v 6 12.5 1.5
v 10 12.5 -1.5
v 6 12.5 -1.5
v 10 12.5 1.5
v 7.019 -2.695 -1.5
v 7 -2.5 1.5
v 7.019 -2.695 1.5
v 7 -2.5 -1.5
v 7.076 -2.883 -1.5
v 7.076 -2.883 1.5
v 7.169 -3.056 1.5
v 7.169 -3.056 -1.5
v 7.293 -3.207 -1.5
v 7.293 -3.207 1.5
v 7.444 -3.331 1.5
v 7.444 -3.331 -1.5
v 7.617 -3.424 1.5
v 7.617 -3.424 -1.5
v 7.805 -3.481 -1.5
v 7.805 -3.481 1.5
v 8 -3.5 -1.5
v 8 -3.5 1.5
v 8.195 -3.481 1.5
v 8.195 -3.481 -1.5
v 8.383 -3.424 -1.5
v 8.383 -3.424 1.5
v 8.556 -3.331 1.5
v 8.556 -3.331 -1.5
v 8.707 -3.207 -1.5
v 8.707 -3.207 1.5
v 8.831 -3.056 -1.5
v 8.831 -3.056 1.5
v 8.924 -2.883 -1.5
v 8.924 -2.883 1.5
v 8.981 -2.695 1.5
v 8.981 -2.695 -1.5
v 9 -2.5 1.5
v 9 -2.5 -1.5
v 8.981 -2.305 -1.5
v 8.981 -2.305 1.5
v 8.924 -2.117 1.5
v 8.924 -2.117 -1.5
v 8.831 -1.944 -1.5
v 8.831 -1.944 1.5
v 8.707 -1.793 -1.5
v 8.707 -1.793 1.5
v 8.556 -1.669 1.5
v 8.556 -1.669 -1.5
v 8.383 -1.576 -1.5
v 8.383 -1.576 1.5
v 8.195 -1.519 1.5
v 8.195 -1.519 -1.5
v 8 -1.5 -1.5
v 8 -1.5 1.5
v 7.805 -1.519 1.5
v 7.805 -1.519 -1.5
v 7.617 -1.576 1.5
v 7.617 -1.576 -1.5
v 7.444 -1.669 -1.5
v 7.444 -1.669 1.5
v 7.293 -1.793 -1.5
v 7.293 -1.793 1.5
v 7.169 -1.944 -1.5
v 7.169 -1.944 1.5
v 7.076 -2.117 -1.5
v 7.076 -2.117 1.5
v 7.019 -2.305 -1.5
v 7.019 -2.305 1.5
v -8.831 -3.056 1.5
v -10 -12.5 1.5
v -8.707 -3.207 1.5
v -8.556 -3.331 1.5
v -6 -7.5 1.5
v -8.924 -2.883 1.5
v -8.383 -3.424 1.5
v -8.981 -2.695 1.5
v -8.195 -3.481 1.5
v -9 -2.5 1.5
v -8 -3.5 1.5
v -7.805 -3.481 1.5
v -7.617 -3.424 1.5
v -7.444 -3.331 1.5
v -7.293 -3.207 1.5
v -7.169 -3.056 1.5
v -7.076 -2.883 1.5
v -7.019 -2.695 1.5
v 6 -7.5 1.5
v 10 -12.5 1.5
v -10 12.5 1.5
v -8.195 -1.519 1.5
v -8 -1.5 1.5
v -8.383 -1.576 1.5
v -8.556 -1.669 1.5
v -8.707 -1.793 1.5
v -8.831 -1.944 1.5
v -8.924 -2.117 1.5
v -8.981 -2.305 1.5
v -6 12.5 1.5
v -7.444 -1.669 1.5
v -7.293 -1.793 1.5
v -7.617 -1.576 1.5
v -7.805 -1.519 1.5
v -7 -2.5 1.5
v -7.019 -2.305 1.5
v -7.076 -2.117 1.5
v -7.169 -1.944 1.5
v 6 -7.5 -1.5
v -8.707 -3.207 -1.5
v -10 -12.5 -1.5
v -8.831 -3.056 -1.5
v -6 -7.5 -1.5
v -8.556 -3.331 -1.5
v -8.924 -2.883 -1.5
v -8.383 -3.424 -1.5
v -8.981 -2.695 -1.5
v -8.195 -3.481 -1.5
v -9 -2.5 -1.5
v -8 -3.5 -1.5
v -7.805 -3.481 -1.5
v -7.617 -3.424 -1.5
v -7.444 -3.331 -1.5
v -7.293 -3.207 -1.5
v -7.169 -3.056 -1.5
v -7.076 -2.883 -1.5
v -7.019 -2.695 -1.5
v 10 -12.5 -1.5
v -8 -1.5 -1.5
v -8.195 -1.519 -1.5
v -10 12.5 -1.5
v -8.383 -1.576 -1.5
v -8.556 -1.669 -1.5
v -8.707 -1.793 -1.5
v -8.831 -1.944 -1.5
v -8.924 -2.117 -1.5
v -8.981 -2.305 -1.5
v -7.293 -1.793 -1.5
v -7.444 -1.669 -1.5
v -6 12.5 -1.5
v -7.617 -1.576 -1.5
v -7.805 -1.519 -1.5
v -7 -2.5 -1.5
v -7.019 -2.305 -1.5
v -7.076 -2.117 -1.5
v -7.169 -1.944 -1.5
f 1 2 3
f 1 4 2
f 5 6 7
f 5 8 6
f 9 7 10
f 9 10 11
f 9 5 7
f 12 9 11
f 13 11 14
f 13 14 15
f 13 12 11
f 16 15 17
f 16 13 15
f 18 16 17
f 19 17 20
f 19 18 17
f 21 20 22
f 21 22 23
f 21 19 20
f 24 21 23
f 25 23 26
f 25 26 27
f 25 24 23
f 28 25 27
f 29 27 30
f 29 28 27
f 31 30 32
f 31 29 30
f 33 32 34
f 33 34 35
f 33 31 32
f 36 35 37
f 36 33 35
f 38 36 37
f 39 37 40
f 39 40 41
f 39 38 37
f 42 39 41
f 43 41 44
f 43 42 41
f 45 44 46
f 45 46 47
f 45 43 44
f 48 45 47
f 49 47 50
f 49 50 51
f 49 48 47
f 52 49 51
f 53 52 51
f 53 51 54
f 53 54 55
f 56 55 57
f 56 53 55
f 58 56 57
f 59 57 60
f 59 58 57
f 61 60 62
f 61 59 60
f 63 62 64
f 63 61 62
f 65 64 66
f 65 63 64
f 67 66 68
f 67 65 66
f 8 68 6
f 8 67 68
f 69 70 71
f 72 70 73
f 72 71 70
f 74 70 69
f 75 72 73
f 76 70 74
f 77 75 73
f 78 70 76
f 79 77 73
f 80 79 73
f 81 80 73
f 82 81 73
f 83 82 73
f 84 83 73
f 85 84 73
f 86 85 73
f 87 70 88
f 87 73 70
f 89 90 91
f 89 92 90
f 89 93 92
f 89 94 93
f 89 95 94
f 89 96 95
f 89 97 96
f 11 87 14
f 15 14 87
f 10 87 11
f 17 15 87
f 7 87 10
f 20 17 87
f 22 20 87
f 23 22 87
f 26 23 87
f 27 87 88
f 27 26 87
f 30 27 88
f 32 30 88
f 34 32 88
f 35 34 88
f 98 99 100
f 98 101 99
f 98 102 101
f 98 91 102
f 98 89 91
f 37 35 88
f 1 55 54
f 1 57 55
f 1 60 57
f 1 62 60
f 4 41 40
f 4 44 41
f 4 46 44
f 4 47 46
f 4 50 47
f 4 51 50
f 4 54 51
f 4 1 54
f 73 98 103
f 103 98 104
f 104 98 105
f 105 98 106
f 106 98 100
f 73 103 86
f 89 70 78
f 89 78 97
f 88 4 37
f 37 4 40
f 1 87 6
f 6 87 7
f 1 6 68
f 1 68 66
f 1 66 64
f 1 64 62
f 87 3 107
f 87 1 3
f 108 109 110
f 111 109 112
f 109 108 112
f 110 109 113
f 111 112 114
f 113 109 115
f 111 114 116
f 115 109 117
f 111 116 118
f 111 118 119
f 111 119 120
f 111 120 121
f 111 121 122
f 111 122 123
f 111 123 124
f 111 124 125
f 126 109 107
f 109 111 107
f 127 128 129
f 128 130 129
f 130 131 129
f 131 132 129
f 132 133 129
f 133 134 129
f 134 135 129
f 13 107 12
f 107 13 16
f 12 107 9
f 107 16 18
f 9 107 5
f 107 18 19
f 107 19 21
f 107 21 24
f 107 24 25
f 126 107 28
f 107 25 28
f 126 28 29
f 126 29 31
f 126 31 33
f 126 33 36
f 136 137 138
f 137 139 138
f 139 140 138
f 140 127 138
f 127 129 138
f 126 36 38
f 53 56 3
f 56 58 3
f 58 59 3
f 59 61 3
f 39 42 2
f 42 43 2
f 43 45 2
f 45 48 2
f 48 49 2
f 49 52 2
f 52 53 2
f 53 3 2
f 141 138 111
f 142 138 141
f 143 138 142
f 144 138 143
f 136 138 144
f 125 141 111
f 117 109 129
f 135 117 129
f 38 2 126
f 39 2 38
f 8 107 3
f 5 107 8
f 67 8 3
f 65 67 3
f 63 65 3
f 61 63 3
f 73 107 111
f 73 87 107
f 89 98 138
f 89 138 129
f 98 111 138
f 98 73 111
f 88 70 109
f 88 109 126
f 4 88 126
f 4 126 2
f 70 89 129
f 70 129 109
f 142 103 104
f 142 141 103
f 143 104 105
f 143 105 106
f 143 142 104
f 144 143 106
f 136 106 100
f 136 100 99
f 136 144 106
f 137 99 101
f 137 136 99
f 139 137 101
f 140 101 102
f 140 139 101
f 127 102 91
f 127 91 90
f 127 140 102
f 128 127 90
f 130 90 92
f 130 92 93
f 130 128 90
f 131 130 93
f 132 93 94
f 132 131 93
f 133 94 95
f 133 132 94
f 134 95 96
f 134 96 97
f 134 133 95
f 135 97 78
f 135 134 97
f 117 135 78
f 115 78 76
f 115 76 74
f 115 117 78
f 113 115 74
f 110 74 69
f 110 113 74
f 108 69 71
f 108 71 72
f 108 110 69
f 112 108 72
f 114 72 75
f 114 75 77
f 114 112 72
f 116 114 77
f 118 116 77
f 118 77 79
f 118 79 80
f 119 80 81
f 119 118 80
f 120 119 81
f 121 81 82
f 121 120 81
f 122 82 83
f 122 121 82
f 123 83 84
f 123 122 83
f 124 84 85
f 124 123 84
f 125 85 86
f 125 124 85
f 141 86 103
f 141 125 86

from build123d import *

# Parameters (mm, degrees)
SKETCH3_R           = 1
BOSS_EXTRUDE1_DEPTH = 1.5


with BuildPart() as part:
    # Sketch3 → Boss-Extrude1 (new, symmetric)
    with BuildSketch(Plane.XY):
        Polygon((-6, -7.5), (-6, 12.5), (-10, 12.5), (-10, -12.5), (10, -12.5), (10, 12.5), (6, 12.5), (6, -7.5), align=None)
        with Locations((-8, -2.5)):
            Circle(SKETCH3_R, mode=Mode.SUBTRACT)
        with Locations(Location((8, -2.5, 0), (0, 0, 180))):
            Circle(SKETCH3_R, mode=Mode.SUBTRACT)
    extrude(amount=BOSS_EXTRUDE1_DEPTH, both=True)


solid = part.part
